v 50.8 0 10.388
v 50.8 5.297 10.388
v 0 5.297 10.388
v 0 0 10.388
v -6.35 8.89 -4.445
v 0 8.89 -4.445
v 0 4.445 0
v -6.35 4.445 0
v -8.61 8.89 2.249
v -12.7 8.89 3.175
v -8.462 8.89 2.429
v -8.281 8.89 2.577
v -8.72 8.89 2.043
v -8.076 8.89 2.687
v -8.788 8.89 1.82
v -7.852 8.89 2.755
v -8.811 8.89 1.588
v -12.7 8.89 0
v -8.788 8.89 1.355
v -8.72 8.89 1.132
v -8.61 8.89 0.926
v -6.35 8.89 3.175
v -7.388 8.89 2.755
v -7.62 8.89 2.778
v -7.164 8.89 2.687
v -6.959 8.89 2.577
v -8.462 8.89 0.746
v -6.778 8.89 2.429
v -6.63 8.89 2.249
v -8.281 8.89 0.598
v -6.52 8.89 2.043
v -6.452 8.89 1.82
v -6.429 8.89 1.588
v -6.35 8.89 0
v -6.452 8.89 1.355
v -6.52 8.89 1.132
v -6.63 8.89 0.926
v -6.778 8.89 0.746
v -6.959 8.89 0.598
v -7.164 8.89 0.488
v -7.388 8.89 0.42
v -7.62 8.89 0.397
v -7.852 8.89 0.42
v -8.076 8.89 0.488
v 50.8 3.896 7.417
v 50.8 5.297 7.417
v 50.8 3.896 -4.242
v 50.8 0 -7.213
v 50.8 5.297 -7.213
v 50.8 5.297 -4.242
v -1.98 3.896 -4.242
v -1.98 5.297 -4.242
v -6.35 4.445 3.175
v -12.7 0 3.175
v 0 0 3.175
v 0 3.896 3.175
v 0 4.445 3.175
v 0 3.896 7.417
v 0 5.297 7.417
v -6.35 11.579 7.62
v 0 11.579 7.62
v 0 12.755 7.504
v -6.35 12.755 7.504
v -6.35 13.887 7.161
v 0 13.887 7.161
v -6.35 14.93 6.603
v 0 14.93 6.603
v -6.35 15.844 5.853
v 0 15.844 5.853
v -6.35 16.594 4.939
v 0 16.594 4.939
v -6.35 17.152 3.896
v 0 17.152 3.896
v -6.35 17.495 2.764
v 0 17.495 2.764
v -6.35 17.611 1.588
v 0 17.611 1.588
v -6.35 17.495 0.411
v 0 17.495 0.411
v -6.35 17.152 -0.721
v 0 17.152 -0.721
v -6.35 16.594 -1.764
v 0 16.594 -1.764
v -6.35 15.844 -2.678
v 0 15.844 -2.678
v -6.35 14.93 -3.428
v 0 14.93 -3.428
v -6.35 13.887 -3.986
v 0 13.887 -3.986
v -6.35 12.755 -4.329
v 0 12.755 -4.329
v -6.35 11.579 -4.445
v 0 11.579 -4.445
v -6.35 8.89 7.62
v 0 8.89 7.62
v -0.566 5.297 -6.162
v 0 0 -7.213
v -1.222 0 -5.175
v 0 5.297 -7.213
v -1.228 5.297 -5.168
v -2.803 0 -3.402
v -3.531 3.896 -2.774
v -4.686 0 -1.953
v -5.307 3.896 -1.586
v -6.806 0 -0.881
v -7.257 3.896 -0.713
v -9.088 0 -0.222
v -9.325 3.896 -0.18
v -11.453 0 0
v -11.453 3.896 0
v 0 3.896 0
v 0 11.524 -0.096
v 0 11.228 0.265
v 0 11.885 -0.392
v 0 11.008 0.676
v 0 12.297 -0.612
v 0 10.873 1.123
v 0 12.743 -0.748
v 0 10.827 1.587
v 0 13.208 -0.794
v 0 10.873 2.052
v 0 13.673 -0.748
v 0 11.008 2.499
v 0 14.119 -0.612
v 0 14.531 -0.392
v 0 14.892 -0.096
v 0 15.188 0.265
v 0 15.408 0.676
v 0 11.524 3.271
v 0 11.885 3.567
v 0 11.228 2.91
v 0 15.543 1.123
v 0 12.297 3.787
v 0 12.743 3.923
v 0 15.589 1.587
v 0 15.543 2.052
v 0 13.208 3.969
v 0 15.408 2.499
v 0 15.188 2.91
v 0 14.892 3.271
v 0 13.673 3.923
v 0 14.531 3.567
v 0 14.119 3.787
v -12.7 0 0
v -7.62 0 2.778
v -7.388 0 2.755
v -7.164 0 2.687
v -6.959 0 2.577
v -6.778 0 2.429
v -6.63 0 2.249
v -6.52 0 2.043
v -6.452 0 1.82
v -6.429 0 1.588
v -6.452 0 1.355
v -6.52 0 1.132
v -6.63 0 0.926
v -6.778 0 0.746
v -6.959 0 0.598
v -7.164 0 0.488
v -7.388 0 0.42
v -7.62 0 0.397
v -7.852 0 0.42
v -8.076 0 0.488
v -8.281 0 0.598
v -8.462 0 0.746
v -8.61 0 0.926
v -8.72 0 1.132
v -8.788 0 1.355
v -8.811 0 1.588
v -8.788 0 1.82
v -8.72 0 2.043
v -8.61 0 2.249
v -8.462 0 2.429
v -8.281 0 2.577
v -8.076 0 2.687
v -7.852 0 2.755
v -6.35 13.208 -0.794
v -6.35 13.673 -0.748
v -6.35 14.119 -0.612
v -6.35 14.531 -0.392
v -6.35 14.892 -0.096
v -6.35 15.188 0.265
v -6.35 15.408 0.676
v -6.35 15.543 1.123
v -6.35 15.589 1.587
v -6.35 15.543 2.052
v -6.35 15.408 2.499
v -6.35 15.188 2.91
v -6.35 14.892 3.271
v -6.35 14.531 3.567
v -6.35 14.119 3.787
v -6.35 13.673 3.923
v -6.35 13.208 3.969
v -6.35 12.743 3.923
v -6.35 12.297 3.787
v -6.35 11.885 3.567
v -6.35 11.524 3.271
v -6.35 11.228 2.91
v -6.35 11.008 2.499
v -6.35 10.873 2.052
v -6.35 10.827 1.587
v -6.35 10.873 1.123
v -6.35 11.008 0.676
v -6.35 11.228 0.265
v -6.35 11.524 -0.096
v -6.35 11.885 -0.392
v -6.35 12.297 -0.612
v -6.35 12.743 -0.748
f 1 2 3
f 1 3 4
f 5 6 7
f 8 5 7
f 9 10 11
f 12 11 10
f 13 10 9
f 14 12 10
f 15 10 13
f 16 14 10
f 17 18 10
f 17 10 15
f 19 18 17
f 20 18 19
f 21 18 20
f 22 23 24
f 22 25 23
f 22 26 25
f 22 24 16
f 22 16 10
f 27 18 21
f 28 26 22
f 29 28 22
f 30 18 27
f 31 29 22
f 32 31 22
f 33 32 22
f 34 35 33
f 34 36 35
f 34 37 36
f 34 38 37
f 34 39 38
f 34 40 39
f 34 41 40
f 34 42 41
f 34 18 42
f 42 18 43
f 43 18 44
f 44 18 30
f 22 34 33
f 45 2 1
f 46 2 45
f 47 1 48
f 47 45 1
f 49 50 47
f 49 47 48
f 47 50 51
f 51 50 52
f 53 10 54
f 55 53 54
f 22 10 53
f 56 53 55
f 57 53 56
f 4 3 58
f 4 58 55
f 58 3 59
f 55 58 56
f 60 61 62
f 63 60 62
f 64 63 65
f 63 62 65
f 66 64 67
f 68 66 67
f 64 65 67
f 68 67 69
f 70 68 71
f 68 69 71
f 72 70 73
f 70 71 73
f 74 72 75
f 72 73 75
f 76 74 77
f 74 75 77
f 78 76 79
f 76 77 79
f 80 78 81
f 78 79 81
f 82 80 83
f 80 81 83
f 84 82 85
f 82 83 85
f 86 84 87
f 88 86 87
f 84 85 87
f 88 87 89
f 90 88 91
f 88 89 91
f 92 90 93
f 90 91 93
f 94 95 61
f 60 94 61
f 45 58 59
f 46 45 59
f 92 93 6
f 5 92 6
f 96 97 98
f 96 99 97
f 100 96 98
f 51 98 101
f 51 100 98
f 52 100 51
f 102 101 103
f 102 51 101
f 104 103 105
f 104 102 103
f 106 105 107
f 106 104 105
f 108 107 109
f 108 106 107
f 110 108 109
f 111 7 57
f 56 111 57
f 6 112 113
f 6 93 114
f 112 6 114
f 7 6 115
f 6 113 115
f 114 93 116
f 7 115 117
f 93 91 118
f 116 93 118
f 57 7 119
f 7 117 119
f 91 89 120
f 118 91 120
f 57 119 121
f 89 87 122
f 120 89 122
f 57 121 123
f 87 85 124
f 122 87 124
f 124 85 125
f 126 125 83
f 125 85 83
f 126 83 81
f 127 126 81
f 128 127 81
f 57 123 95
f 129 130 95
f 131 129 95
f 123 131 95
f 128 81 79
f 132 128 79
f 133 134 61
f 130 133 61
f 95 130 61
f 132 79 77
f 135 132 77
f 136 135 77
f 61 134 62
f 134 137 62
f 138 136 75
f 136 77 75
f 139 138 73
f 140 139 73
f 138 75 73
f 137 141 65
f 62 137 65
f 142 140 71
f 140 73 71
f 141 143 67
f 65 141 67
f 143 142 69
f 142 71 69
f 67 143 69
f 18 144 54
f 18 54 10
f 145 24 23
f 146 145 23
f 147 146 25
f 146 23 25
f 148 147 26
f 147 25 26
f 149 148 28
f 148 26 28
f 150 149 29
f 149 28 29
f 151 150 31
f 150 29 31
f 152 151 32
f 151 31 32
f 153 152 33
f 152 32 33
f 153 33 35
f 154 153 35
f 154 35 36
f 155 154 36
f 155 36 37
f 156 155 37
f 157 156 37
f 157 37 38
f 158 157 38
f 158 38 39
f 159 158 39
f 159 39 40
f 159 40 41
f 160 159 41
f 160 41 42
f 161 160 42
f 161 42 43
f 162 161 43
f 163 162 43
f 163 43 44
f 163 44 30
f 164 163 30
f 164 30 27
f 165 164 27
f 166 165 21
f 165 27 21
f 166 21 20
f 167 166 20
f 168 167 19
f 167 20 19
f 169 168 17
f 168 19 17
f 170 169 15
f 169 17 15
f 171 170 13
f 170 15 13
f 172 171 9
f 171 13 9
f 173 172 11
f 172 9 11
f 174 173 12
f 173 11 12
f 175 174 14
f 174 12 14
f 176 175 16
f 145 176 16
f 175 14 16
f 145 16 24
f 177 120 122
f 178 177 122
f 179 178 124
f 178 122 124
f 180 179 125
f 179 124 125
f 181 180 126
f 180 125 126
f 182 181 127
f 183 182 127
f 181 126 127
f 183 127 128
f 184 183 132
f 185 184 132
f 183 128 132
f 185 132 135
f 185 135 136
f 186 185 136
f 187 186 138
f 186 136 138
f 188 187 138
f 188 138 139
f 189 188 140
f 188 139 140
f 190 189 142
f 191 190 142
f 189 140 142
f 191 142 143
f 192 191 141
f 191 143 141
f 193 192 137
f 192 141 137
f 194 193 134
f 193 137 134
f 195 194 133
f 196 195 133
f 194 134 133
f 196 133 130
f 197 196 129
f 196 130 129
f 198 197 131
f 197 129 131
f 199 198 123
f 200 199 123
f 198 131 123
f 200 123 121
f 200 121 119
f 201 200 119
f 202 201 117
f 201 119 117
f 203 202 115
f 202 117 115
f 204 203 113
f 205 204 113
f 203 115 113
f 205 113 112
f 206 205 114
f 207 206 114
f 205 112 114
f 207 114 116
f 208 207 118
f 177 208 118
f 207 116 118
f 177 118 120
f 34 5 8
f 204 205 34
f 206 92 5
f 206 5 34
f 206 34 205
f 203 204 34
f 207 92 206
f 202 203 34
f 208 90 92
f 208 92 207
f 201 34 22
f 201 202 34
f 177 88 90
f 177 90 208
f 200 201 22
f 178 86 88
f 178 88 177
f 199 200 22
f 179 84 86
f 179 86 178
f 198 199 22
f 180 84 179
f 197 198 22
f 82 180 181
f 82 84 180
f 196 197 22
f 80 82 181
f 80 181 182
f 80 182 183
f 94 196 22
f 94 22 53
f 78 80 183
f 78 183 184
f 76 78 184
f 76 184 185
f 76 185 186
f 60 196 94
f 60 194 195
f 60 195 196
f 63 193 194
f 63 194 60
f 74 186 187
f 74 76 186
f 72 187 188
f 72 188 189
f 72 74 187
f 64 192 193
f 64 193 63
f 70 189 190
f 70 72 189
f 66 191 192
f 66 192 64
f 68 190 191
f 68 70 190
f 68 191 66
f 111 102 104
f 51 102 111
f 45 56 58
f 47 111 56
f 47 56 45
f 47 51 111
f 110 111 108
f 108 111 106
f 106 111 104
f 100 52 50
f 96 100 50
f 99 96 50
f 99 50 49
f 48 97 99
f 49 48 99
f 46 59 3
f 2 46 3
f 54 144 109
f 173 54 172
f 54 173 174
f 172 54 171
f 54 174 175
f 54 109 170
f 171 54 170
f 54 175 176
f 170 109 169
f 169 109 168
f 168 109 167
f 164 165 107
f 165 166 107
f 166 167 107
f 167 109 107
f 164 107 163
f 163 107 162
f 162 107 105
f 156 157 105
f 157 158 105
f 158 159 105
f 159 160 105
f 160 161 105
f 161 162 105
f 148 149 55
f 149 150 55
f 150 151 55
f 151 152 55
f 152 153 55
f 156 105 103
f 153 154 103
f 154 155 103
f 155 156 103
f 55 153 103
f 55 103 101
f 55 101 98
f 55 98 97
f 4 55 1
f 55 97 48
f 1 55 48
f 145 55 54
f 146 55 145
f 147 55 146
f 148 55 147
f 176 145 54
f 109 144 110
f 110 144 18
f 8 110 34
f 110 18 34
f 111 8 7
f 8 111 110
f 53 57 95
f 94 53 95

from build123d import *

# Parameters (mm, degrees)
SKETCH1_W           = 12.7
SKETCH1_H           = 8.89
BOSS_EXTRUDE1_DEPTH = 3.175
SKETCH2_R           = 2.38125
BOSS_EXTRUDE2_DEPTH = 6.35
CUT_EXTRUDE1_REACH  = 19.274
SKETCH4_R           = 1.190625
BOSS_EXTRUDE3_DEPTH = 50.8
FILLET1_R           = 12.7


with BuildPart() as part:
    # Sketch1 → Boss-Extrude1 (new body)
    with BuildSketch(Plane.XY):
        with Locations((-6.35, 4.445)):
            Rectangle(SKETCH1_W, SKETCH1_H)
    extrude(amount=BOSS_EXTRUDE1_DEPTH)

    # Sketch2 → Boss-Extrude2 (add)
    with BuildSketch(Plane(origin=(0, 0, 0), x_dir=(0, 0, -1), z_dir=(1, 0, 0))):
        with BuildLine():
            Line((-3.175, 4.445), (-7.62, 8.89))
            Line((-7.62, 8.89), (-7.62, 11.578578051))
            ThreePointArc((-7.62, 11.578578051), (-1.5875, 17.611078051), (4.445, 11.578578051))
            Line((4.445, 11.578578051), (4.445, 8.89))
            Line((4.445, 8.89), (0, 4.445))
            Line((0, 4.445), (0, 8.89))
            Line((0, 8.89), (-3.175, 8.89))
            Line((-3.175, 8.89), (-3.175, 4.445))
        make_face()
        with Locations((-1.5875, 13.208)):
            Circle(SKETCH2_R, mode=Mode.SUBTRACT)
    extrude(amount=-BOSS_EXTRUDE2_DEPTH)

    # Sketch4 → Cut-Extrude1 (cut, up to next)
    with BuildSketch(Plane(origin=(0, 8.89, 0), x_dir=(1, 0, 0), z_dir=(0, 1, 0)), mode=Mode.PRIVATE) as cut_extrude1_sk1:
        with Locations(Location((-7.62, -1.5875, 0), (0, 0, 270))):
            Circle(SKETCH4_R)
    cut_extrude1_tool1 = extrude(cut_extrude1_sk1.sketch, amount=-CUT_EXTRUDE1_REACH, mode=Mode.PRIVATE) & part.part
    add(cut_extrude1_tool1.solids().sort_by_distance((-7.62, 8.89, 1.5875))[0], mode=Mode.SUBTRACT)

    # Sketch5 → Boss-Extrude3 (add)
    with BuildSketch(Plane(origin=(0, 0, 0), x_dir=(0, 0, -1), z_dir=(1, 0, 0))):
        Polygon((-7.416824551, 5.296838174), (-10.387538025, 5.296838174), (-10.387538025, 0), (0, 0), (7.212538025, 0), (7.212538025, 5.296838174), (4.241824551, 5.296838174), (4.241824551, 3.895558234), (0, 3.895558234), (-3.175, 3.895558234), (-7.416824551, 3.895558234), align=None)
    extrude(amount=BOSS_EXTRUDE3_DEPTH)

    # Fillet1
    # the kernel refuses this fillet: 12.7 mm, written as the material it adds along each edge
    with BuildSketch(Plane(origin=(0, 32.528773329, 0), x_dir=(-1, 0, 0), z_dir=(0, -1, 0))) as fillet1_piece_1_section:
        with BuildLine():
            CenterArc((11.453286038, 12.7), FILLET1_R, 205.599864758, 64.400135242)
            Line((0, 7.212538025), (0, 0))
            Line((0, 0), (11.453286038, 0))
        make_face()
    fillet1_piece_1 = extrude(amount=32.528773329, mode=Mode.PRIVATE)
    fillet1_piece_1 = split(fillet1_piece_1, bisect_by=Plane(origin=(-0.789431936, 5.296838174, -5.756080296), z_dir=(0, -1, 0)), keep=Keep.TOP, mode=Mode.PRIVATE)
    fillet1_piece_1 = split(fillet1_piece_1, bisect_by=Plane(origin=(-0.789431936, 4.596198204, -4.241824551), z_dir=(0, 0, -1)), keep=Keep.TOP, mode=Mode.PRIVATE)
    add(fillet1_piece_1)
    with BuildSketch(Plane(origin=(0, 3.895558234, 0), x_dir=(-1, 0, 0), z_dir=(0, -1, 0))) as fillet1_piece_2:
        with BuildLine():
            CenterArc((11.453286038, 12.7), FILLET1_R, 205.599864758, 64.400135242)
            Line((0, 7.212538025), (0, 0))
            Line((0, 0), (11.453286038, 0))
        make_face()
    extrude(amount=3.895558234)


solid = part.part
